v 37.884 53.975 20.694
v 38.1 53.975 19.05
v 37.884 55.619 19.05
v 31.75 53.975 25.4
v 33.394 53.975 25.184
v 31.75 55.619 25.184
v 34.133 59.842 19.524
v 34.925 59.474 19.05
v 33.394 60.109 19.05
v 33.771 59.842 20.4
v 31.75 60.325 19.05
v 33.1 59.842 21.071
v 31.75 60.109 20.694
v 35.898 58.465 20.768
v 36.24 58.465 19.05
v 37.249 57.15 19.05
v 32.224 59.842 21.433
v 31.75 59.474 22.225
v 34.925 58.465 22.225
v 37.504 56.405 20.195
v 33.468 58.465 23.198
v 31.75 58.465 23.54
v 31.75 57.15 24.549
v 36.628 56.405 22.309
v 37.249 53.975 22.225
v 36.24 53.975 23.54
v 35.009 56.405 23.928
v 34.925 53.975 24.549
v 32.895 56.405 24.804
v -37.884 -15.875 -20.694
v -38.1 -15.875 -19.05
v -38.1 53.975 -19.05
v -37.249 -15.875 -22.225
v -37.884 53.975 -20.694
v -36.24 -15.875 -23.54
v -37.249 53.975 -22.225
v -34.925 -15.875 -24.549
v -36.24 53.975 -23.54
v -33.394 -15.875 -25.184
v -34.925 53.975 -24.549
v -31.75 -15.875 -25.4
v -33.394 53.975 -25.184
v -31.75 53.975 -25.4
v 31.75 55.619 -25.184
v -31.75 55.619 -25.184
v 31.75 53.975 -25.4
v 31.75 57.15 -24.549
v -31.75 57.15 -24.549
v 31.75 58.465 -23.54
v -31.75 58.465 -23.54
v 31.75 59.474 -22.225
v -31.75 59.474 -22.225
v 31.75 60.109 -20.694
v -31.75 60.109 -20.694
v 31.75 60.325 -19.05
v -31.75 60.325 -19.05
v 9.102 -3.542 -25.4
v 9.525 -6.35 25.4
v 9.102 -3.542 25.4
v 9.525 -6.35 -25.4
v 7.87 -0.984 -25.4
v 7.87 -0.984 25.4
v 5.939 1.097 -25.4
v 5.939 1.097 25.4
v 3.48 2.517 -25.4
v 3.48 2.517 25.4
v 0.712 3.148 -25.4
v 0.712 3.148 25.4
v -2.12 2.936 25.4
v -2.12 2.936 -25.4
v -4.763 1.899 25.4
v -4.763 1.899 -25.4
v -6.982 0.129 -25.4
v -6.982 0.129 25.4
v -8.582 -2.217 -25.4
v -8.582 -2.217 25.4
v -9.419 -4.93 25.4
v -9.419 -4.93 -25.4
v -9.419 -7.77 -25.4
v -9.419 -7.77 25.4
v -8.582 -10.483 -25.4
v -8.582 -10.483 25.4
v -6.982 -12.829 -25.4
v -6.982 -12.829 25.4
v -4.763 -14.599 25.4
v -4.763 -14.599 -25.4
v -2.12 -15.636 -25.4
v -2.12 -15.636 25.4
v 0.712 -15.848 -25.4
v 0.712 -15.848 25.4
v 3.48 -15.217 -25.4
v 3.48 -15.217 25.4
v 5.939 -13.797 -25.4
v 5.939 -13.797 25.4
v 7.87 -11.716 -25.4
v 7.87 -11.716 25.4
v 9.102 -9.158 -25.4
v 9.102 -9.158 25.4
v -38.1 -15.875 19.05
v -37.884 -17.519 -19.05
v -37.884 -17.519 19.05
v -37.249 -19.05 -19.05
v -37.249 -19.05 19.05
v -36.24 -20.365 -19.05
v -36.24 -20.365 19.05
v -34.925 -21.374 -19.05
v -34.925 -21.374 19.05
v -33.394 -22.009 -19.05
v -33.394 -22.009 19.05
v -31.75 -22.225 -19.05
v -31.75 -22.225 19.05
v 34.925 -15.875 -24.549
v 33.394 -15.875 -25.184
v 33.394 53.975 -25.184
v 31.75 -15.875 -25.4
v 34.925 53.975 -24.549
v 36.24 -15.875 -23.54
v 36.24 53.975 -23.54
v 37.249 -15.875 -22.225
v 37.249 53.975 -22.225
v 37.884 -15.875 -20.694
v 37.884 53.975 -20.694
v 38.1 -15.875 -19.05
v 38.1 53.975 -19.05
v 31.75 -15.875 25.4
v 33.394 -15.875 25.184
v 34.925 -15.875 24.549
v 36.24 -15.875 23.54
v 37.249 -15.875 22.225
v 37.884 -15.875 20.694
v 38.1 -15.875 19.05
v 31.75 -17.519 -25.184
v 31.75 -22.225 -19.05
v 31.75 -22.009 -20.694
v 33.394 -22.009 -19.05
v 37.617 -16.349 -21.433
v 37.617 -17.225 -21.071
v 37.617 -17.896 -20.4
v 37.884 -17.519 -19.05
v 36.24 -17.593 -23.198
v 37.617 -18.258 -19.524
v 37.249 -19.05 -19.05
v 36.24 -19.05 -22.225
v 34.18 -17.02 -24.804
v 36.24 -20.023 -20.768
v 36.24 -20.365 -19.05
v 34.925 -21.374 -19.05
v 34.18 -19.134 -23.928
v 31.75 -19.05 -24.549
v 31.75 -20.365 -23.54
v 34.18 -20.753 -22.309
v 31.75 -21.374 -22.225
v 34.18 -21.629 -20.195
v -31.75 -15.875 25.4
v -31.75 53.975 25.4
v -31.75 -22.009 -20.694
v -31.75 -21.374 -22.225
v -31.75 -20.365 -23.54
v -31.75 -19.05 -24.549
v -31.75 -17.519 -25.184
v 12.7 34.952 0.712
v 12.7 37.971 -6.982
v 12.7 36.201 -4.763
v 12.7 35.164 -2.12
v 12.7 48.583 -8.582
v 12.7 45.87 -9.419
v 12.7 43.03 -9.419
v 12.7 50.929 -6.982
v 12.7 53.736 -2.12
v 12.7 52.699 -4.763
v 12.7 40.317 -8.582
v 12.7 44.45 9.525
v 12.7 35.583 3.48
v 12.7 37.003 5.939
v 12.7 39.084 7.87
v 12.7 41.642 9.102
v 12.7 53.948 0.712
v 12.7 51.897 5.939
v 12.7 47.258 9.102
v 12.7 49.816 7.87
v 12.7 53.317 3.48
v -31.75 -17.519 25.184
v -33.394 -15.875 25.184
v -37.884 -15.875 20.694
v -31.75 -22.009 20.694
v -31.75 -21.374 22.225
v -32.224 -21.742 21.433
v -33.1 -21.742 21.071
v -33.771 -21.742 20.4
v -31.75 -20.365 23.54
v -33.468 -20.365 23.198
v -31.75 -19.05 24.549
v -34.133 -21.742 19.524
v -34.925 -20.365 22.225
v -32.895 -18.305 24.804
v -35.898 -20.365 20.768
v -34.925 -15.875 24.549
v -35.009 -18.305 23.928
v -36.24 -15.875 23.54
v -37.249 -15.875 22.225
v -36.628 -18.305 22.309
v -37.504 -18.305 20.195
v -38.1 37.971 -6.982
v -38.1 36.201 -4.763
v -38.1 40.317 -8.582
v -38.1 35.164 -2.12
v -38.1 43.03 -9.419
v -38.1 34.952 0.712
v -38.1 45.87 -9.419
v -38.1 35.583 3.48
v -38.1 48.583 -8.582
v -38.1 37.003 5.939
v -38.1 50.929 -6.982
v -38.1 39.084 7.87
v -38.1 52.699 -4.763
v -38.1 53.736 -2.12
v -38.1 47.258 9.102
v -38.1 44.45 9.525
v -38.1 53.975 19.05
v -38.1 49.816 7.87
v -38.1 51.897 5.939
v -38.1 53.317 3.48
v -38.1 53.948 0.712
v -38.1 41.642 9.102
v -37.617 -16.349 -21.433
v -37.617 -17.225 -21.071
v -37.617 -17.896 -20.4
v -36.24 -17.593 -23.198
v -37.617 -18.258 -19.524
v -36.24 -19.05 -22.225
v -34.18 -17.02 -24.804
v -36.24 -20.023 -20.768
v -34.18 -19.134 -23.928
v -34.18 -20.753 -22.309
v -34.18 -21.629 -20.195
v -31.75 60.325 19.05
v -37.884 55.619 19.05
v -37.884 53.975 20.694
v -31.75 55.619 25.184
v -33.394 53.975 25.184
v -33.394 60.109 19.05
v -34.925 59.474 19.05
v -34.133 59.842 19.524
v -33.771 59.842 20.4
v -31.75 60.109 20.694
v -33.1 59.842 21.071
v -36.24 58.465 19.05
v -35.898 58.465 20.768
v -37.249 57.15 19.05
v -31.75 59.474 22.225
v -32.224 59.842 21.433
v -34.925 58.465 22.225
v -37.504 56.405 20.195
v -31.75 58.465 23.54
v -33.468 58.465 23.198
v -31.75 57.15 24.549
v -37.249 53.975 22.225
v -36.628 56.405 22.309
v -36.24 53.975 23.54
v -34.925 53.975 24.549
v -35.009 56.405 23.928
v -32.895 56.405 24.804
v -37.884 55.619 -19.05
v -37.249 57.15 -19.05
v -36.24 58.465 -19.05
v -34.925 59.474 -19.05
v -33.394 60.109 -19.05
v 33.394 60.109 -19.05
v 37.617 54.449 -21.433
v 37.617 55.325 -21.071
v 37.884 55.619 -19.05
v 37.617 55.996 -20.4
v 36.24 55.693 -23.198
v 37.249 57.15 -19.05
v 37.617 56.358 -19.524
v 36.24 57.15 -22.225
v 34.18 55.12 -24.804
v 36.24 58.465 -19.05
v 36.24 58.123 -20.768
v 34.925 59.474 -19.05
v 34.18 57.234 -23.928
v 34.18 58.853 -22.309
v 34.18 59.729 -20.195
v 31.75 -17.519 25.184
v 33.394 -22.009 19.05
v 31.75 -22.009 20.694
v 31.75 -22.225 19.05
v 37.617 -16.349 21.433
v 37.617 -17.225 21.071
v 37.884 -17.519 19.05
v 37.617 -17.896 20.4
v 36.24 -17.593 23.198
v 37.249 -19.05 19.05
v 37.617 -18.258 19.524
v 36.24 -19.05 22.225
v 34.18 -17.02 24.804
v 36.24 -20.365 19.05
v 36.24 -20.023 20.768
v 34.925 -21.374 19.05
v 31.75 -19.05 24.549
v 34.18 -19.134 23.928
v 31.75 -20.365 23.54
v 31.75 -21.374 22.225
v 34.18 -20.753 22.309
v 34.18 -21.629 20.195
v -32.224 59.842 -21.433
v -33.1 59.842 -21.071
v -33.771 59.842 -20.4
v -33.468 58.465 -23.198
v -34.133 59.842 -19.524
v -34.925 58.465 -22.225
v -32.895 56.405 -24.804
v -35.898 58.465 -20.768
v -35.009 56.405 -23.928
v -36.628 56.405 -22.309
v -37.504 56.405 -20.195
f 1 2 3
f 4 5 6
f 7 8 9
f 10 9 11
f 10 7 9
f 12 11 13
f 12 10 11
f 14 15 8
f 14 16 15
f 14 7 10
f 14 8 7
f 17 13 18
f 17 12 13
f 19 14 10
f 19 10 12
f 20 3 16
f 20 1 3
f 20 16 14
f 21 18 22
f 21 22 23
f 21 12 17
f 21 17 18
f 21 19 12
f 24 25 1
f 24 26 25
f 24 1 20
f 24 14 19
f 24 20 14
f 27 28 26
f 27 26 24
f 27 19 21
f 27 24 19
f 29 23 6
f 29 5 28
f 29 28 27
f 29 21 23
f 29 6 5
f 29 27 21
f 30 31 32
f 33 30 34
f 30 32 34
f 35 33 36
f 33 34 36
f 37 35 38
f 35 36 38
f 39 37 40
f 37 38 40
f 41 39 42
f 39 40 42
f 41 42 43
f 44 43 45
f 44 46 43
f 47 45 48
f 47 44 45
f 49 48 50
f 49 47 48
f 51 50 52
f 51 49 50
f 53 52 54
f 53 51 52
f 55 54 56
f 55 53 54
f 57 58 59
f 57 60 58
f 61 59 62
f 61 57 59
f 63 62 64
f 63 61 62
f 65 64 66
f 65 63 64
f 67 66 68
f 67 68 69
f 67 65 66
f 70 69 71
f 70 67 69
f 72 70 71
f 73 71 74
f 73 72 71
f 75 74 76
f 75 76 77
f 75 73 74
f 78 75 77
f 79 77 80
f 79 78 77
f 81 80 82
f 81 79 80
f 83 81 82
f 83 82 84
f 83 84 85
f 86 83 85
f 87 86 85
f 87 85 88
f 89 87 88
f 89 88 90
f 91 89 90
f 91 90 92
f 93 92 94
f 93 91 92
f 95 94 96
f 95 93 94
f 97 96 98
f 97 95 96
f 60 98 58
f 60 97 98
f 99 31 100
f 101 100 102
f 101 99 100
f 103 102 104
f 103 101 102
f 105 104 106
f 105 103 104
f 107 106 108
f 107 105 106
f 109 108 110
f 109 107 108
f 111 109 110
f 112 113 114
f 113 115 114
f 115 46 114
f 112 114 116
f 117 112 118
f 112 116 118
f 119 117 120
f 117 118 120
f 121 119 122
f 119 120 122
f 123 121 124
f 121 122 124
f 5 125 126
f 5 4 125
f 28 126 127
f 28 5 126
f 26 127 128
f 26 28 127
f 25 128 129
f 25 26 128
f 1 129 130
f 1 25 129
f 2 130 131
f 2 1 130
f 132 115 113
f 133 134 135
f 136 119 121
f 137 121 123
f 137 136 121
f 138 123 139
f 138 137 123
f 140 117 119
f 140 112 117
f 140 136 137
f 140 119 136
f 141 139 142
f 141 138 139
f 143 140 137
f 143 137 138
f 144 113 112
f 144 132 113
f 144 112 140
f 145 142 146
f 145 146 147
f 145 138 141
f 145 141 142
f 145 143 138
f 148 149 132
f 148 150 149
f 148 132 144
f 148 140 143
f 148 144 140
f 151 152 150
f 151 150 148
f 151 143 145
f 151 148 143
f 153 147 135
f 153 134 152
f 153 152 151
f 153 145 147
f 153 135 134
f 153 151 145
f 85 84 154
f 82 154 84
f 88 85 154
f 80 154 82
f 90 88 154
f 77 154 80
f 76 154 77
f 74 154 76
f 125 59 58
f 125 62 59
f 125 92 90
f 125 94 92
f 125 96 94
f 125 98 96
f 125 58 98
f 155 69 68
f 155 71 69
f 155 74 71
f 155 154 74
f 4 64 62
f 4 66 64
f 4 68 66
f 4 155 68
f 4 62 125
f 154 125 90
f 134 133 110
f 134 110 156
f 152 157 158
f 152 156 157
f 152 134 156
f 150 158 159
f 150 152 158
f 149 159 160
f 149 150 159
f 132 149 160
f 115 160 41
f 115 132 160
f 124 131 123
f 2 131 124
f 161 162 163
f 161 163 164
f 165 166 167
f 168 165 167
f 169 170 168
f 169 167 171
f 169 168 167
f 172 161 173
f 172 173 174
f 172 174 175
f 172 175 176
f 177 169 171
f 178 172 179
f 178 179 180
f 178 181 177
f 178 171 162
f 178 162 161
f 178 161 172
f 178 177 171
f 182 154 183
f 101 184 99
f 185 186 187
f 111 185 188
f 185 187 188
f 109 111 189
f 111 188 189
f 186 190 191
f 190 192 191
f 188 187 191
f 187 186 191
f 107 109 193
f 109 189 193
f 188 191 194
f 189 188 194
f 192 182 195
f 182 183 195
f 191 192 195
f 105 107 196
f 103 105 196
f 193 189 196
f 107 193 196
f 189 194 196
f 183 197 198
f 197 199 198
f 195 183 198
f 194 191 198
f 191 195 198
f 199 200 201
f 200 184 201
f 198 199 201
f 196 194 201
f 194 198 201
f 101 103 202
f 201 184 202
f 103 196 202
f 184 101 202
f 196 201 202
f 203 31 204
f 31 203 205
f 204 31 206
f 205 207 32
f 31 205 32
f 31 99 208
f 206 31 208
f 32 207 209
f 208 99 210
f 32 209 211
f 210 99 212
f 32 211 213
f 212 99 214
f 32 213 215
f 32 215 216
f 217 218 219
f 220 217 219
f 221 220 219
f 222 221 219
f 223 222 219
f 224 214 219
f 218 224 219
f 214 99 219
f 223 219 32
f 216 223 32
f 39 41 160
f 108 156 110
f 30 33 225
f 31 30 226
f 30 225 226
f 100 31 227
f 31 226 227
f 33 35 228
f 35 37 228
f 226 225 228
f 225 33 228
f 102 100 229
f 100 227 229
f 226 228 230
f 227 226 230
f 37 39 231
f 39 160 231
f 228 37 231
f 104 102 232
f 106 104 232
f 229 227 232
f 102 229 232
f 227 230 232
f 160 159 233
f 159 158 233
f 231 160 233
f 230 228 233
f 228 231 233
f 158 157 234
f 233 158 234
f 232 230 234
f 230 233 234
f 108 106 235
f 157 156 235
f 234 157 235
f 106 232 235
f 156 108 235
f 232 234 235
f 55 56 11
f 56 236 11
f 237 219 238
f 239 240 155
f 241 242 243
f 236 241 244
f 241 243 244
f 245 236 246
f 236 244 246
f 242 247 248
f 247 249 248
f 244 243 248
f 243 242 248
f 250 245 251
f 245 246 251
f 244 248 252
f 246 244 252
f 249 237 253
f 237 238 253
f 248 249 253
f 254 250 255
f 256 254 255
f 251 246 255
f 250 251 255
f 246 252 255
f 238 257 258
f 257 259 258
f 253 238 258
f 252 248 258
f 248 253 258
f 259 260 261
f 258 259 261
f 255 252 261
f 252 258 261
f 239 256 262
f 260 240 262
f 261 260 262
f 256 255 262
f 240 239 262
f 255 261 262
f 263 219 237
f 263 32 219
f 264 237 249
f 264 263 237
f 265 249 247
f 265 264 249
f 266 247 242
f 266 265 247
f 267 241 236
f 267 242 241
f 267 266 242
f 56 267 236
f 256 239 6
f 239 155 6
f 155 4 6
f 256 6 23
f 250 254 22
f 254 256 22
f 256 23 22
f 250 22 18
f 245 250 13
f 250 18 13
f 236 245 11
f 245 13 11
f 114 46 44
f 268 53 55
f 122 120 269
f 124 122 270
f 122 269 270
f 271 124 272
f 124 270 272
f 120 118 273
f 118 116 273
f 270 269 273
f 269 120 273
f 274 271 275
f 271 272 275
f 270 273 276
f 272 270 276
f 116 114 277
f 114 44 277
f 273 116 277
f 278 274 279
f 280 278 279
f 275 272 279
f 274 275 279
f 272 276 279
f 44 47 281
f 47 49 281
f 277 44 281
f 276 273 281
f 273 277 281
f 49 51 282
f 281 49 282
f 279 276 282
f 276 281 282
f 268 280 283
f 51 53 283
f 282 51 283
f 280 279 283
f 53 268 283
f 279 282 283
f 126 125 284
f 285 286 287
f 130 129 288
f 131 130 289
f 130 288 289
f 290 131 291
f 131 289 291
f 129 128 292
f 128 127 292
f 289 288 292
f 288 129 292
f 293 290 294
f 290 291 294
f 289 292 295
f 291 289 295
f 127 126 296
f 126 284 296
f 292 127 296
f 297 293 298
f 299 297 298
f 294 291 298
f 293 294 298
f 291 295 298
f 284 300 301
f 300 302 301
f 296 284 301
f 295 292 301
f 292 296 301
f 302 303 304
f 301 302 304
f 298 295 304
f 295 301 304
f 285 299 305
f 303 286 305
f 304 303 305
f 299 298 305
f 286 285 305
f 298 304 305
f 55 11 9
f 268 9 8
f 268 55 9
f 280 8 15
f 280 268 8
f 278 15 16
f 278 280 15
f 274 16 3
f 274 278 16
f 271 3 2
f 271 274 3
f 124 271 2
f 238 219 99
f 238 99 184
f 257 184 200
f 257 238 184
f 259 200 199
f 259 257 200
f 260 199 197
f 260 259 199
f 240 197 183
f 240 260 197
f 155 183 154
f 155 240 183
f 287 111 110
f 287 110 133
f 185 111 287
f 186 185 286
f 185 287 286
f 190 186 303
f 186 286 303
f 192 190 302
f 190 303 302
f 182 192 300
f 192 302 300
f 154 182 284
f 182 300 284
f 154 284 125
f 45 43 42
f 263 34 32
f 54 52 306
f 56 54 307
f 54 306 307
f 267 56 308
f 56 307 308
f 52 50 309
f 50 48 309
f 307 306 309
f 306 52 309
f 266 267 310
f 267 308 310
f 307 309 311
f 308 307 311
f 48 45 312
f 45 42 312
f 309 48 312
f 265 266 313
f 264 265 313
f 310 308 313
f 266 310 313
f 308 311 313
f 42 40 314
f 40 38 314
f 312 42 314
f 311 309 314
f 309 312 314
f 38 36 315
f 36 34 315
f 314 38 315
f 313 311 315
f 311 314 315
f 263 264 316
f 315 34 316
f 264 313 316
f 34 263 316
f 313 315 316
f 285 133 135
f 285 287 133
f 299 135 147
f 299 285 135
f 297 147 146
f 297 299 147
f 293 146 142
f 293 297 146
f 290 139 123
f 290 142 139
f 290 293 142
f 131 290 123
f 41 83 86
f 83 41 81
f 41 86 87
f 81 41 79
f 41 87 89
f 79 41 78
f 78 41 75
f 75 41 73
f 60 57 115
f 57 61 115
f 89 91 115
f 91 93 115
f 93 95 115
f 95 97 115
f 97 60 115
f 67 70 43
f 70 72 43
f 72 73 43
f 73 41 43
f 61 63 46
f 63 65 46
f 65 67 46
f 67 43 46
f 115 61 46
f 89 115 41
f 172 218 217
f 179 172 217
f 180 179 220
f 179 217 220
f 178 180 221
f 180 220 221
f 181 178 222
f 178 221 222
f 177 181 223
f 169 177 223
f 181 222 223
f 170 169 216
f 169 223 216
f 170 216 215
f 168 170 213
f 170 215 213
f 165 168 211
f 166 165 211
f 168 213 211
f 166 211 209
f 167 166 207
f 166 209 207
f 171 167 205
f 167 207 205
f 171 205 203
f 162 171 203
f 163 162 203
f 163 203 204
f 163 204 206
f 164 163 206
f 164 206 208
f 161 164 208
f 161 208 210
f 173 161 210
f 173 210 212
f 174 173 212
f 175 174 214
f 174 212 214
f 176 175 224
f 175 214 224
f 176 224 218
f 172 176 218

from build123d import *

# Parameters (mm, degrees)
SKETCH1_W           = 76.2
SKETCH1_H           = 82.55
SKETCH1_R           = 9.525
BOSS_EXTRUDE1_DEPTH = 25.4
SKETCH2_R           = 9.525
CUT_EXTRUDE1_DEPTH  = 50.8
FILLET1_R           = 6.35


with BuildPart() as part:
    # Sketch1 → Boss-Extrude1 (new, symmetric)
    with BuildSketch(Plane.XY):
        with Locations((0, 19.05)):
            Rectangle(SKETCH1_W, SKETCH1_H)
        with Locations((0, -6.35)):
            Circle(SKETCH1_R, mode=Mode.SUBTRACT)
    extrude(amount=BOSS_EXTRUDE1_DEPTH, both=True)

    # Sketch2 → Cut-Extrude1 (cut)
    with BuildSketch(Plane.ZY.offset(38.1)):
        with Locations((0, 44.45)):
            Circle(SKETCH2_R)
    extrude(amount=-CUT_EXTRUDE1_DEPTH, mode=Mode.SUBTRACT)

    # Fillet1
    fillet1_edges = [part.edges().sort_by_distance(p)[0] for p in [
        (-38.1, 19.05, 25.4),
        (0, -22.225, 25.4),
        (38.1, 19.05, 25.4),
        (0, -22.225, -25.4),
        (-38.1, 19.05, -25.4),
        (0, 60.325, -25.4),
        (38.1, 19.05, -25.4),
        (38.1, -22.225, 0),
        (-38.1, -22.225, 0),
        (-38.1, 60.325, 0),
        (38.1, 60.325, 0),
        (0, 60.325, 25.4),
    ]]
    fillet(fillet1_edges, radius=FILLET1_R - 0.0001)  # a hair under: the kernel refuses the full size


solid = part.part
